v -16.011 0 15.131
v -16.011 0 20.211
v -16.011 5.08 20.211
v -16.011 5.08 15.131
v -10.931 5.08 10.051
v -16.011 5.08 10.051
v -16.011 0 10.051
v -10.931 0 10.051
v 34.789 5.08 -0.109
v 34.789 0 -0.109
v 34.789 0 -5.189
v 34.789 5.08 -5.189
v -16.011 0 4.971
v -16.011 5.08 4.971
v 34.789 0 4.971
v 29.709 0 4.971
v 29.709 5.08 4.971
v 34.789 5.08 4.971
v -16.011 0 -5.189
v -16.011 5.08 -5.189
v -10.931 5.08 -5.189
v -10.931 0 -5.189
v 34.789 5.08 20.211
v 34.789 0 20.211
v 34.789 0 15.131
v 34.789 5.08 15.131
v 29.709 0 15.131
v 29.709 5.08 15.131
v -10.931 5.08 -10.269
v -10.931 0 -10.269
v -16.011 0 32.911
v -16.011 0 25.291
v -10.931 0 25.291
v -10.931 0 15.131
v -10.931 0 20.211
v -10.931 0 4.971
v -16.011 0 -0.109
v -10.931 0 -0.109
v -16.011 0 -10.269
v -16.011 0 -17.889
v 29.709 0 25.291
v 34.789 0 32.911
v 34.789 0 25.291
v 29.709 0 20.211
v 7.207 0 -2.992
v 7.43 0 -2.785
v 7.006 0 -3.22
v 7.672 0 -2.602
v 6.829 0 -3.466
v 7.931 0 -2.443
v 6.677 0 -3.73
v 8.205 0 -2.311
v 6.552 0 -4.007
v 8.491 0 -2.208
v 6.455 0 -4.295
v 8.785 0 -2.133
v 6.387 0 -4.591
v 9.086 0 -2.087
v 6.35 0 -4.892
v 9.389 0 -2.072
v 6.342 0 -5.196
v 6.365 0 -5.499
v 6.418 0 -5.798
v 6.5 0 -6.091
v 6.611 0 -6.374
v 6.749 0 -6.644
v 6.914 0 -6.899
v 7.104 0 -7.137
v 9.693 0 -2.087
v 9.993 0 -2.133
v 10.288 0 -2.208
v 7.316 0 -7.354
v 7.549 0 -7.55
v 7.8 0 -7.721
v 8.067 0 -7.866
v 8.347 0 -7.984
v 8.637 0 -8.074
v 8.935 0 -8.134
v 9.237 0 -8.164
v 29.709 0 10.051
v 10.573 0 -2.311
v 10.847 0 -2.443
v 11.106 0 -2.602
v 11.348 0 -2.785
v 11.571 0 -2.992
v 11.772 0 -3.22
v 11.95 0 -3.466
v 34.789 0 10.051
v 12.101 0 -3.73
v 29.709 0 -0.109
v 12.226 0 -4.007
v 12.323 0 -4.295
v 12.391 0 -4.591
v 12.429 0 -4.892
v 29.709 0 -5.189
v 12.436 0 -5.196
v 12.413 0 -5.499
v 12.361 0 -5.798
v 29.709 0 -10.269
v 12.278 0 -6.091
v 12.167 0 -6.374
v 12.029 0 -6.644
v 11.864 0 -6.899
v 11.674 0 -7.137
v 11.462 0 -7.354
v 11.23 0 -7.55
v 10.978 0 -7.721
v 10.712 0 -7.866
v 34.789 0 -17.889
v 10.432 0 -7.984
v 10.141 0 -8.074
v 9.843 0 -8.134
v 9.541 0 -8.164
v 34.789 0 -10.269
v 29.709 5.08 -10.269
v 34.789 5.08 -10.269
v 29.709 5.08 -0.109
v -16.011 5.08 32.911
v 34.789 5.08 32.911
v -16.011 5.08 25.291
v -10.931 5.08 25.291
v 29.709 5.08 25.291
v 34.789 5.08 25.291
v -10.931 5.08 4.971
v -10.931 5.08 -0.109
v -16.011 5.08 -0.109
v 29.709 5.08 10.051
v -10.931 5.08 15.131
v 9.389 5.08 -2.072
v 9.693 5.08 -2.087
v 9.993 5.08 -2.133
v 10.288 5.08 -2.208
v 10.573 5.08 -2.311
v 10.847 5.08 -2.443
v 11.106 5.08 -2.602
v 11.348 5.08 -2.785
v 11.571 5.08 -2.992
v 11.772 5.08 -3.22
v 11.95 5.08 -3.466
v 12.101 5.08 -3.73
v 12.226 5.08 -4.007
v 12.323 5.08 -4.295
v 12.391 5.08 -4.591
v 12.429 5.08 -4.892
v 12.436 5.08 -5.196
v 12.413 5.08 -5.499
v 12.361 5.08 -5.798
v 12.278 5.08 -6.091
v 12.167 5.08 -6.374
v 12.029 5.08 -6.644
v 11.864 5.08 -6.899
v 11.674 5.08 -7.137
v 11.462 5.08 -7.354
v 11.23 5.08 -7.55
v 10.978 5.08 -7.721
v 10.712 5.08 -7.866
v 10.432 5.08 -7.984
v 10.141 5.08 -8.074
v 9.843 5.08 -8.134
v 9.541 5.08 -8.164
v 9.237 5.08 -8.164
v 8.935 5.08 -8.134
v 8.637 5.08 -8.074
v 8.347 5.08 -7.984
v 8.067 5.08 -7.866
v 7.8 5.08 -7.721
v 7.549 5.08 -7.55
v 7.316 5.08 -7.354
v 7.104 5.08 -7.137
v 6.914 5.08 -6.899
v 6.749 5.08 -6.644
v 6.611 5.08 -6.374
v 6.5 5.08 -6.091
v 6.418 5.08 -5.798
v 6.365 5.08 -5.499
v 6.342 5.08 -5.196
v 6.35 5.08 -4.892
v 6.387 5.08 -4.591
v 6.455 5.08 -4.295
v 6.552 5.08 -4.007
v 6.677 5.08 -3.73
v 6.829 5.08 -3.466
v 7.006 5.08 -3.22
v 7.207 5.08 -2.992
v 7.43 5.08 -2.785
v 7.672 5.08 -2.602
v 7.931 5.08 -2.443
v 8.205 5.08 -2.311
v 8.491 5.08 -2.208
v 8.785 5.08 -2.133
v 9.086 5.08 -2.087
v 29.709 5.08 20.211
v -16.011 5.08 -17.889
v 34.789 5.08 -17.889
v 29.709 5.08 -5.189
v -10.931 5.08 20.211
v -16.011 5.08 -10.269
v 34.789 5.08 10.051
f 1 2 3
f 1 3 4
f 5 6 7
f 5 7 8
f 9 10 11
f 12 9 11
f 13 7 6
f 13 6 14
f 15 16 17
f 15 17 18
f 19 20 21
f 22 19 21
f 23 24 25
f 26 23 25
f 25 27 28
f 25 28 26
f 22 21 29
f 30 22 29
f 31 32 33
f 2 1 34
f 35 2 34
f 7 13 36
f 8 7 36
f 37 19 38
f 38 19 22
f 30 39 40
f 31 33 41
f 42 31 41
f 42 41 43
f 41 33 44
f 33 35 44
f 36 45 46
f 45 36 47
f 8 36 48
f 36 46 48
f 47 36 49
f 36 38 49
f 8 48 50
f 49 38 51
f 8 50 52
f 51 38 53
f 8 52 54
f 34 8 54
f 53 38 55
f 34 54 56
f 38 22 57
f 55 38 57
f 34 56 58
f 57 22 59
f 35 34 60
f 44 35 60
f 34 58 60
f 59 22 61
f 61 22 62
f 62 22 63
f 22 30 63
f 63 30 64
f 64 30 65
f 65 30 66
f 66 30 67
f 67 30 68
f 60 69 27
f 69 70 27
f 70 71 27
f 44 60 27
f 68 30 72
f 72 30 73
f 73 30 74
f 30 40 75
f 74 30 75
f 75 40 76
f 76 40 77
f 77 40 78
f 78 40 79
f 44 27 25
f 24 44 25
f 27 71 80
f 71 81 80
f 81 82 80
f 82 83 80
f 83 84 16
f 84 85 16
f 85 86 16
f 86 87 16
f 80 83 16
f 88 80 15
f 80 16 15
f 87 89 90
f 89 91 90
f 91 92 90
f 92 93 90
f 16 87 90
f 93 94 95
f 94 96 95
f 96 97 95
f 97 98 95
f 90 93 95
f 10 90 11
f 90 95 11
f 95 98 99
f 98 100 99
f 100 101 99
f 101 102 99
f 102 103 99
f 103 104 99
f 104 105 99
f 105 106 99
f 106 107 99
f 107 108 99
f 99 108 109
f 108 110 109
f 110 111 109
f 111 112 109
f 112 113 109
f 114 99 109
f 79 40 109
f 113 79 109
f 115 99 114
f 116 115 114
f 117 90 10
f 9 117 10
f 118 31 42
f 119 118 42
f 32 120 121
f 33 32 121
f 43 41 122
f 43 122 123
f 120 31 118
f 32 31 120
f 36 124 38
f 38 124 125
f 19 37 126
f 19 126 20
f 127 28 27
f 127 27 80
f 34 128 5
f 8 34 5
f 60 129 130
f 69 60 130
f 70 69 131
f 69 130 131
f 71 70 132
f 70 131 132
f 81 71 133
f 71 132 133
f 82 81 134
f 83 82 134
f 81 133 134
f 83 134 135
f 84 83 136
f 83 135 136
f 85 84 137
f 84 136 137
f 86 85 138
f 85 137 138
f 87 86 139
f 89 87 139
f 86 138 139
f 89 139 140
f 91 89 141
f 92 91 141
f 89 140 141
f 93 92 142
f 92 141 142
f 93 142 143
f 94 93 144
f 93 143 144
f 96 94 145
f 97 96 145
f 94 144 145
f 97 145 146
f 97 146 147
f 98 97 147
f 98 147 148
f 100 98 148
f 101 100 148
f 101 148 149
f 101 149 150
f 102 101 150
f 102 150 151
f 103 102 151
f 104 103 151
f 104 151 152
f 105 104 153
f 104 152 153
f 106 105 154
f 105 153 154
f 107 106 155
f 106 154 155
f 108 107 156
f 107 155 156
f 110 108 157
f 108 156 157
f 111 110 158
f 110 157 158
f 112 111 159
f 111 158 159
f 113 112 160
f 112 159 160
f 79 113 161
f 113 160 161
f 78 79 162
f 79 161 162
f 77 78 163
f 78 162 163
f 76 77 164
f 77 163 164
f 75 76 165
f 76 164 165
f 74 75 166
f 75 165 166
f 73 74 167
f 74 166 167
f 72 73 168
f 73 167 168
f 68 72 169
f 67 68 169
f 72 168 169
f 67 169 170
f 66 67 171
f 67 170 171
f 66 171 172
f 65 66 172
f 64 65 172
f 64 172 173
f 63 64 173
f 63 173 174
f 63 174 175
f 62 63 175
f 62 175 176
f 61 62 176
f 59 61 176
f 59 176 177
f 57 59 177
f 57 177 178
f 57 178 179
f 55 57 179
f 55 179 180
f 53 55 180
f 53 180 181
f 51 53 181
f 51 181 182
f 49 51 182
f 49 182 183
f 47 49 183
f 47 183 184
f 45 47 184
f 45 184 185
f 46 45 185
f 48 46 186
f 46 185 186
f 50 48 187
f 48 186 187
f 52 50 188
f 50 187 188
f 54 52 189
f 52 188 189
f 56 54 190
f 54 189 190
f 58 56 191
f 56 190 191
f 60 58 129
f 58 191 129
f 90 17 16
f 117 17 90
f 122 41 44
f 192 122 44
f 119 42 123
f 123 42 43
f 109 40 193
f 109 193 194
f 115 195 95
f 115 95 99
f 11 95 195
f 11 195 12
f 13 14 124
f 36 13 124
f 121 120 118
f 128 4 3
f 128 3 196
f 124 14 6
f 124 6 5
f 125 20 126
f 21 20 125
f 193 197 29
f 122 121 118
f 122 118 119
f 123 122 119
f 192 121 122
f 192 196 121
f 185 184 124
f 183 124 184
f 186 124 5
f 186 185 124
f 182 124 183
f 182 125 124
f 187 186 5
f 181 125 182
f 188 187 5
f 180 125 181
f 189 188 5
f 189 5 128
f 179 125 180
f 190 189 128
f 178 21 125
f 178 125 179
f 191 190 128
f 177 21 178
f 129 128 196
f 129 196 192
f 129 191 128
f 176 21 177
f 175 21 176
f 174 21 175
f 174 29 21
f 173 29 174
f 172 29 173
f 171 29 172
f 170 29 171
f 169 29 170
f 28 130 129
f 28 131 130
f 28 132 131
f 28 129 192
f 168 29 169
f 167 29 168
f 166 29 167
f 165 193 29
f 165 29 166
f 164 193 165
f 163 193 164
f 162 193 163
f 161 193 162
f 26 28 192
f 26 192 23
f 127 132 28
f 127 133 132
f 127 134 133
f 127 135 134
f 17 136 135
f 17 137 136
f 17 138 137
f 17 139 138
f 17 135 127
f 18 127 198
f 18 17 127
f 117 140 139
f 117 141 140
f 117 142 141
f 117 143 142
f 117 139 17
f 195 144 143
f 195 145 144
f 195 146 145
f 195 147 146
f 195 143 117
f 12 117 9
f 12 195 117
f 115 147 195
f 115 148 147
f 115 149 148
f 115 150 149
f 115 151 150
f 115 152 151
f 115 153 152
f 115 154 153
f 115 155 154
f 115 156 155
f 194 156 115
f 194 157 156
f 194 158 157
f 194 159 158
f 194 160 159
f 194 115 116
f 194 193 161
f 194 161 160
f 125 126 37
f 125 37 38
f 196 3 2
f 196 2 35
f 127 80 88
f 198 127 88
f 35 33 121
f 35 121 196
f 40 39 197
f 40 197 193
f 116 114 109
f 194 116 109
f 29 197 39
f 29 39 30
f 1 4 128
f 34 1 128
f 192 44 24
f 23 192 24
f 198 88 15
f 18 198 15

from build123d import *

# Parameters (mm, degrees)
SKETCH1_W           = 50.8
SKETCH1_H           = 50.8
BOSS_EXTRUDE1_DEPTH = 5.08
SKETCH2_R           = 3.048
SKETCH2_W           = 5.08
SKETCH2_H           = 5.08
CUT_EXTRUDE1_DEPTH  = 5.08


with BuildPart() as part:
    # Sketch1 → Boss-Extrude1 (new body)
    with BuildSketch(Plane(origin=(0, 0, 0), x_dir=(1, 0, 0), z_dir=(0, 1, 0))):
        with Locations((9.389105058, -7.511284047)):
            Rectangle(SKETCH1_W, SKETCH1_H)
    extrude(amount=BOSS_EXTRUDE1_DEPTH)

    # Sketch2 → Cut-Extrude1 (cut)
    with BuildSketch(Plane(origin=(0, 5.08, 0), x_dir=(1, 0, 0), z_dir=(0, 1, 0))):
        with Locations(Location((9.389105058, 5.120135953, 0), (0, 0, 270))):
            Circle(SKETCH2_R)
        with Locations((32.249105058, -22.751284047)):
            Rectangle(SKETCH2_W, SKETCH2_H)
        with Locations((-13.470894942, -12.591284047)):
            Rectangle(SKETCH2_W, SKETCH2_H)
        with Locations((-13.470894942, -22.751284047)):
            Rectangle(SKETCH2_W, SKETCH2_H)
        with Locations((32.249105058, -12.591284047)):
            Rectangle(SKETCH2_W, SKETCH2_H)
        with Locations((32.249105058, -2.431284047)):
            Rectangle(SKETCH2_W, SKETCH2_H)
        with Locations((32.249105058, 7.728715953)):
            Rectangle(SKETCH2_W, SKETCH2_H)
        with Locations((-13.470894942, 7.728715953)):
            Rectangle(SKETCH2_W, SKETCH2_H)
        with Locations((-13.470894942, -2.431284047)):
            Rectangle(SKETCH2_W, SKETCH2_H)
    extrude(amount=-CUT_EXTRUDE1_DEPTH, mode=Mode.SUBTRACT)


solid = part.part
